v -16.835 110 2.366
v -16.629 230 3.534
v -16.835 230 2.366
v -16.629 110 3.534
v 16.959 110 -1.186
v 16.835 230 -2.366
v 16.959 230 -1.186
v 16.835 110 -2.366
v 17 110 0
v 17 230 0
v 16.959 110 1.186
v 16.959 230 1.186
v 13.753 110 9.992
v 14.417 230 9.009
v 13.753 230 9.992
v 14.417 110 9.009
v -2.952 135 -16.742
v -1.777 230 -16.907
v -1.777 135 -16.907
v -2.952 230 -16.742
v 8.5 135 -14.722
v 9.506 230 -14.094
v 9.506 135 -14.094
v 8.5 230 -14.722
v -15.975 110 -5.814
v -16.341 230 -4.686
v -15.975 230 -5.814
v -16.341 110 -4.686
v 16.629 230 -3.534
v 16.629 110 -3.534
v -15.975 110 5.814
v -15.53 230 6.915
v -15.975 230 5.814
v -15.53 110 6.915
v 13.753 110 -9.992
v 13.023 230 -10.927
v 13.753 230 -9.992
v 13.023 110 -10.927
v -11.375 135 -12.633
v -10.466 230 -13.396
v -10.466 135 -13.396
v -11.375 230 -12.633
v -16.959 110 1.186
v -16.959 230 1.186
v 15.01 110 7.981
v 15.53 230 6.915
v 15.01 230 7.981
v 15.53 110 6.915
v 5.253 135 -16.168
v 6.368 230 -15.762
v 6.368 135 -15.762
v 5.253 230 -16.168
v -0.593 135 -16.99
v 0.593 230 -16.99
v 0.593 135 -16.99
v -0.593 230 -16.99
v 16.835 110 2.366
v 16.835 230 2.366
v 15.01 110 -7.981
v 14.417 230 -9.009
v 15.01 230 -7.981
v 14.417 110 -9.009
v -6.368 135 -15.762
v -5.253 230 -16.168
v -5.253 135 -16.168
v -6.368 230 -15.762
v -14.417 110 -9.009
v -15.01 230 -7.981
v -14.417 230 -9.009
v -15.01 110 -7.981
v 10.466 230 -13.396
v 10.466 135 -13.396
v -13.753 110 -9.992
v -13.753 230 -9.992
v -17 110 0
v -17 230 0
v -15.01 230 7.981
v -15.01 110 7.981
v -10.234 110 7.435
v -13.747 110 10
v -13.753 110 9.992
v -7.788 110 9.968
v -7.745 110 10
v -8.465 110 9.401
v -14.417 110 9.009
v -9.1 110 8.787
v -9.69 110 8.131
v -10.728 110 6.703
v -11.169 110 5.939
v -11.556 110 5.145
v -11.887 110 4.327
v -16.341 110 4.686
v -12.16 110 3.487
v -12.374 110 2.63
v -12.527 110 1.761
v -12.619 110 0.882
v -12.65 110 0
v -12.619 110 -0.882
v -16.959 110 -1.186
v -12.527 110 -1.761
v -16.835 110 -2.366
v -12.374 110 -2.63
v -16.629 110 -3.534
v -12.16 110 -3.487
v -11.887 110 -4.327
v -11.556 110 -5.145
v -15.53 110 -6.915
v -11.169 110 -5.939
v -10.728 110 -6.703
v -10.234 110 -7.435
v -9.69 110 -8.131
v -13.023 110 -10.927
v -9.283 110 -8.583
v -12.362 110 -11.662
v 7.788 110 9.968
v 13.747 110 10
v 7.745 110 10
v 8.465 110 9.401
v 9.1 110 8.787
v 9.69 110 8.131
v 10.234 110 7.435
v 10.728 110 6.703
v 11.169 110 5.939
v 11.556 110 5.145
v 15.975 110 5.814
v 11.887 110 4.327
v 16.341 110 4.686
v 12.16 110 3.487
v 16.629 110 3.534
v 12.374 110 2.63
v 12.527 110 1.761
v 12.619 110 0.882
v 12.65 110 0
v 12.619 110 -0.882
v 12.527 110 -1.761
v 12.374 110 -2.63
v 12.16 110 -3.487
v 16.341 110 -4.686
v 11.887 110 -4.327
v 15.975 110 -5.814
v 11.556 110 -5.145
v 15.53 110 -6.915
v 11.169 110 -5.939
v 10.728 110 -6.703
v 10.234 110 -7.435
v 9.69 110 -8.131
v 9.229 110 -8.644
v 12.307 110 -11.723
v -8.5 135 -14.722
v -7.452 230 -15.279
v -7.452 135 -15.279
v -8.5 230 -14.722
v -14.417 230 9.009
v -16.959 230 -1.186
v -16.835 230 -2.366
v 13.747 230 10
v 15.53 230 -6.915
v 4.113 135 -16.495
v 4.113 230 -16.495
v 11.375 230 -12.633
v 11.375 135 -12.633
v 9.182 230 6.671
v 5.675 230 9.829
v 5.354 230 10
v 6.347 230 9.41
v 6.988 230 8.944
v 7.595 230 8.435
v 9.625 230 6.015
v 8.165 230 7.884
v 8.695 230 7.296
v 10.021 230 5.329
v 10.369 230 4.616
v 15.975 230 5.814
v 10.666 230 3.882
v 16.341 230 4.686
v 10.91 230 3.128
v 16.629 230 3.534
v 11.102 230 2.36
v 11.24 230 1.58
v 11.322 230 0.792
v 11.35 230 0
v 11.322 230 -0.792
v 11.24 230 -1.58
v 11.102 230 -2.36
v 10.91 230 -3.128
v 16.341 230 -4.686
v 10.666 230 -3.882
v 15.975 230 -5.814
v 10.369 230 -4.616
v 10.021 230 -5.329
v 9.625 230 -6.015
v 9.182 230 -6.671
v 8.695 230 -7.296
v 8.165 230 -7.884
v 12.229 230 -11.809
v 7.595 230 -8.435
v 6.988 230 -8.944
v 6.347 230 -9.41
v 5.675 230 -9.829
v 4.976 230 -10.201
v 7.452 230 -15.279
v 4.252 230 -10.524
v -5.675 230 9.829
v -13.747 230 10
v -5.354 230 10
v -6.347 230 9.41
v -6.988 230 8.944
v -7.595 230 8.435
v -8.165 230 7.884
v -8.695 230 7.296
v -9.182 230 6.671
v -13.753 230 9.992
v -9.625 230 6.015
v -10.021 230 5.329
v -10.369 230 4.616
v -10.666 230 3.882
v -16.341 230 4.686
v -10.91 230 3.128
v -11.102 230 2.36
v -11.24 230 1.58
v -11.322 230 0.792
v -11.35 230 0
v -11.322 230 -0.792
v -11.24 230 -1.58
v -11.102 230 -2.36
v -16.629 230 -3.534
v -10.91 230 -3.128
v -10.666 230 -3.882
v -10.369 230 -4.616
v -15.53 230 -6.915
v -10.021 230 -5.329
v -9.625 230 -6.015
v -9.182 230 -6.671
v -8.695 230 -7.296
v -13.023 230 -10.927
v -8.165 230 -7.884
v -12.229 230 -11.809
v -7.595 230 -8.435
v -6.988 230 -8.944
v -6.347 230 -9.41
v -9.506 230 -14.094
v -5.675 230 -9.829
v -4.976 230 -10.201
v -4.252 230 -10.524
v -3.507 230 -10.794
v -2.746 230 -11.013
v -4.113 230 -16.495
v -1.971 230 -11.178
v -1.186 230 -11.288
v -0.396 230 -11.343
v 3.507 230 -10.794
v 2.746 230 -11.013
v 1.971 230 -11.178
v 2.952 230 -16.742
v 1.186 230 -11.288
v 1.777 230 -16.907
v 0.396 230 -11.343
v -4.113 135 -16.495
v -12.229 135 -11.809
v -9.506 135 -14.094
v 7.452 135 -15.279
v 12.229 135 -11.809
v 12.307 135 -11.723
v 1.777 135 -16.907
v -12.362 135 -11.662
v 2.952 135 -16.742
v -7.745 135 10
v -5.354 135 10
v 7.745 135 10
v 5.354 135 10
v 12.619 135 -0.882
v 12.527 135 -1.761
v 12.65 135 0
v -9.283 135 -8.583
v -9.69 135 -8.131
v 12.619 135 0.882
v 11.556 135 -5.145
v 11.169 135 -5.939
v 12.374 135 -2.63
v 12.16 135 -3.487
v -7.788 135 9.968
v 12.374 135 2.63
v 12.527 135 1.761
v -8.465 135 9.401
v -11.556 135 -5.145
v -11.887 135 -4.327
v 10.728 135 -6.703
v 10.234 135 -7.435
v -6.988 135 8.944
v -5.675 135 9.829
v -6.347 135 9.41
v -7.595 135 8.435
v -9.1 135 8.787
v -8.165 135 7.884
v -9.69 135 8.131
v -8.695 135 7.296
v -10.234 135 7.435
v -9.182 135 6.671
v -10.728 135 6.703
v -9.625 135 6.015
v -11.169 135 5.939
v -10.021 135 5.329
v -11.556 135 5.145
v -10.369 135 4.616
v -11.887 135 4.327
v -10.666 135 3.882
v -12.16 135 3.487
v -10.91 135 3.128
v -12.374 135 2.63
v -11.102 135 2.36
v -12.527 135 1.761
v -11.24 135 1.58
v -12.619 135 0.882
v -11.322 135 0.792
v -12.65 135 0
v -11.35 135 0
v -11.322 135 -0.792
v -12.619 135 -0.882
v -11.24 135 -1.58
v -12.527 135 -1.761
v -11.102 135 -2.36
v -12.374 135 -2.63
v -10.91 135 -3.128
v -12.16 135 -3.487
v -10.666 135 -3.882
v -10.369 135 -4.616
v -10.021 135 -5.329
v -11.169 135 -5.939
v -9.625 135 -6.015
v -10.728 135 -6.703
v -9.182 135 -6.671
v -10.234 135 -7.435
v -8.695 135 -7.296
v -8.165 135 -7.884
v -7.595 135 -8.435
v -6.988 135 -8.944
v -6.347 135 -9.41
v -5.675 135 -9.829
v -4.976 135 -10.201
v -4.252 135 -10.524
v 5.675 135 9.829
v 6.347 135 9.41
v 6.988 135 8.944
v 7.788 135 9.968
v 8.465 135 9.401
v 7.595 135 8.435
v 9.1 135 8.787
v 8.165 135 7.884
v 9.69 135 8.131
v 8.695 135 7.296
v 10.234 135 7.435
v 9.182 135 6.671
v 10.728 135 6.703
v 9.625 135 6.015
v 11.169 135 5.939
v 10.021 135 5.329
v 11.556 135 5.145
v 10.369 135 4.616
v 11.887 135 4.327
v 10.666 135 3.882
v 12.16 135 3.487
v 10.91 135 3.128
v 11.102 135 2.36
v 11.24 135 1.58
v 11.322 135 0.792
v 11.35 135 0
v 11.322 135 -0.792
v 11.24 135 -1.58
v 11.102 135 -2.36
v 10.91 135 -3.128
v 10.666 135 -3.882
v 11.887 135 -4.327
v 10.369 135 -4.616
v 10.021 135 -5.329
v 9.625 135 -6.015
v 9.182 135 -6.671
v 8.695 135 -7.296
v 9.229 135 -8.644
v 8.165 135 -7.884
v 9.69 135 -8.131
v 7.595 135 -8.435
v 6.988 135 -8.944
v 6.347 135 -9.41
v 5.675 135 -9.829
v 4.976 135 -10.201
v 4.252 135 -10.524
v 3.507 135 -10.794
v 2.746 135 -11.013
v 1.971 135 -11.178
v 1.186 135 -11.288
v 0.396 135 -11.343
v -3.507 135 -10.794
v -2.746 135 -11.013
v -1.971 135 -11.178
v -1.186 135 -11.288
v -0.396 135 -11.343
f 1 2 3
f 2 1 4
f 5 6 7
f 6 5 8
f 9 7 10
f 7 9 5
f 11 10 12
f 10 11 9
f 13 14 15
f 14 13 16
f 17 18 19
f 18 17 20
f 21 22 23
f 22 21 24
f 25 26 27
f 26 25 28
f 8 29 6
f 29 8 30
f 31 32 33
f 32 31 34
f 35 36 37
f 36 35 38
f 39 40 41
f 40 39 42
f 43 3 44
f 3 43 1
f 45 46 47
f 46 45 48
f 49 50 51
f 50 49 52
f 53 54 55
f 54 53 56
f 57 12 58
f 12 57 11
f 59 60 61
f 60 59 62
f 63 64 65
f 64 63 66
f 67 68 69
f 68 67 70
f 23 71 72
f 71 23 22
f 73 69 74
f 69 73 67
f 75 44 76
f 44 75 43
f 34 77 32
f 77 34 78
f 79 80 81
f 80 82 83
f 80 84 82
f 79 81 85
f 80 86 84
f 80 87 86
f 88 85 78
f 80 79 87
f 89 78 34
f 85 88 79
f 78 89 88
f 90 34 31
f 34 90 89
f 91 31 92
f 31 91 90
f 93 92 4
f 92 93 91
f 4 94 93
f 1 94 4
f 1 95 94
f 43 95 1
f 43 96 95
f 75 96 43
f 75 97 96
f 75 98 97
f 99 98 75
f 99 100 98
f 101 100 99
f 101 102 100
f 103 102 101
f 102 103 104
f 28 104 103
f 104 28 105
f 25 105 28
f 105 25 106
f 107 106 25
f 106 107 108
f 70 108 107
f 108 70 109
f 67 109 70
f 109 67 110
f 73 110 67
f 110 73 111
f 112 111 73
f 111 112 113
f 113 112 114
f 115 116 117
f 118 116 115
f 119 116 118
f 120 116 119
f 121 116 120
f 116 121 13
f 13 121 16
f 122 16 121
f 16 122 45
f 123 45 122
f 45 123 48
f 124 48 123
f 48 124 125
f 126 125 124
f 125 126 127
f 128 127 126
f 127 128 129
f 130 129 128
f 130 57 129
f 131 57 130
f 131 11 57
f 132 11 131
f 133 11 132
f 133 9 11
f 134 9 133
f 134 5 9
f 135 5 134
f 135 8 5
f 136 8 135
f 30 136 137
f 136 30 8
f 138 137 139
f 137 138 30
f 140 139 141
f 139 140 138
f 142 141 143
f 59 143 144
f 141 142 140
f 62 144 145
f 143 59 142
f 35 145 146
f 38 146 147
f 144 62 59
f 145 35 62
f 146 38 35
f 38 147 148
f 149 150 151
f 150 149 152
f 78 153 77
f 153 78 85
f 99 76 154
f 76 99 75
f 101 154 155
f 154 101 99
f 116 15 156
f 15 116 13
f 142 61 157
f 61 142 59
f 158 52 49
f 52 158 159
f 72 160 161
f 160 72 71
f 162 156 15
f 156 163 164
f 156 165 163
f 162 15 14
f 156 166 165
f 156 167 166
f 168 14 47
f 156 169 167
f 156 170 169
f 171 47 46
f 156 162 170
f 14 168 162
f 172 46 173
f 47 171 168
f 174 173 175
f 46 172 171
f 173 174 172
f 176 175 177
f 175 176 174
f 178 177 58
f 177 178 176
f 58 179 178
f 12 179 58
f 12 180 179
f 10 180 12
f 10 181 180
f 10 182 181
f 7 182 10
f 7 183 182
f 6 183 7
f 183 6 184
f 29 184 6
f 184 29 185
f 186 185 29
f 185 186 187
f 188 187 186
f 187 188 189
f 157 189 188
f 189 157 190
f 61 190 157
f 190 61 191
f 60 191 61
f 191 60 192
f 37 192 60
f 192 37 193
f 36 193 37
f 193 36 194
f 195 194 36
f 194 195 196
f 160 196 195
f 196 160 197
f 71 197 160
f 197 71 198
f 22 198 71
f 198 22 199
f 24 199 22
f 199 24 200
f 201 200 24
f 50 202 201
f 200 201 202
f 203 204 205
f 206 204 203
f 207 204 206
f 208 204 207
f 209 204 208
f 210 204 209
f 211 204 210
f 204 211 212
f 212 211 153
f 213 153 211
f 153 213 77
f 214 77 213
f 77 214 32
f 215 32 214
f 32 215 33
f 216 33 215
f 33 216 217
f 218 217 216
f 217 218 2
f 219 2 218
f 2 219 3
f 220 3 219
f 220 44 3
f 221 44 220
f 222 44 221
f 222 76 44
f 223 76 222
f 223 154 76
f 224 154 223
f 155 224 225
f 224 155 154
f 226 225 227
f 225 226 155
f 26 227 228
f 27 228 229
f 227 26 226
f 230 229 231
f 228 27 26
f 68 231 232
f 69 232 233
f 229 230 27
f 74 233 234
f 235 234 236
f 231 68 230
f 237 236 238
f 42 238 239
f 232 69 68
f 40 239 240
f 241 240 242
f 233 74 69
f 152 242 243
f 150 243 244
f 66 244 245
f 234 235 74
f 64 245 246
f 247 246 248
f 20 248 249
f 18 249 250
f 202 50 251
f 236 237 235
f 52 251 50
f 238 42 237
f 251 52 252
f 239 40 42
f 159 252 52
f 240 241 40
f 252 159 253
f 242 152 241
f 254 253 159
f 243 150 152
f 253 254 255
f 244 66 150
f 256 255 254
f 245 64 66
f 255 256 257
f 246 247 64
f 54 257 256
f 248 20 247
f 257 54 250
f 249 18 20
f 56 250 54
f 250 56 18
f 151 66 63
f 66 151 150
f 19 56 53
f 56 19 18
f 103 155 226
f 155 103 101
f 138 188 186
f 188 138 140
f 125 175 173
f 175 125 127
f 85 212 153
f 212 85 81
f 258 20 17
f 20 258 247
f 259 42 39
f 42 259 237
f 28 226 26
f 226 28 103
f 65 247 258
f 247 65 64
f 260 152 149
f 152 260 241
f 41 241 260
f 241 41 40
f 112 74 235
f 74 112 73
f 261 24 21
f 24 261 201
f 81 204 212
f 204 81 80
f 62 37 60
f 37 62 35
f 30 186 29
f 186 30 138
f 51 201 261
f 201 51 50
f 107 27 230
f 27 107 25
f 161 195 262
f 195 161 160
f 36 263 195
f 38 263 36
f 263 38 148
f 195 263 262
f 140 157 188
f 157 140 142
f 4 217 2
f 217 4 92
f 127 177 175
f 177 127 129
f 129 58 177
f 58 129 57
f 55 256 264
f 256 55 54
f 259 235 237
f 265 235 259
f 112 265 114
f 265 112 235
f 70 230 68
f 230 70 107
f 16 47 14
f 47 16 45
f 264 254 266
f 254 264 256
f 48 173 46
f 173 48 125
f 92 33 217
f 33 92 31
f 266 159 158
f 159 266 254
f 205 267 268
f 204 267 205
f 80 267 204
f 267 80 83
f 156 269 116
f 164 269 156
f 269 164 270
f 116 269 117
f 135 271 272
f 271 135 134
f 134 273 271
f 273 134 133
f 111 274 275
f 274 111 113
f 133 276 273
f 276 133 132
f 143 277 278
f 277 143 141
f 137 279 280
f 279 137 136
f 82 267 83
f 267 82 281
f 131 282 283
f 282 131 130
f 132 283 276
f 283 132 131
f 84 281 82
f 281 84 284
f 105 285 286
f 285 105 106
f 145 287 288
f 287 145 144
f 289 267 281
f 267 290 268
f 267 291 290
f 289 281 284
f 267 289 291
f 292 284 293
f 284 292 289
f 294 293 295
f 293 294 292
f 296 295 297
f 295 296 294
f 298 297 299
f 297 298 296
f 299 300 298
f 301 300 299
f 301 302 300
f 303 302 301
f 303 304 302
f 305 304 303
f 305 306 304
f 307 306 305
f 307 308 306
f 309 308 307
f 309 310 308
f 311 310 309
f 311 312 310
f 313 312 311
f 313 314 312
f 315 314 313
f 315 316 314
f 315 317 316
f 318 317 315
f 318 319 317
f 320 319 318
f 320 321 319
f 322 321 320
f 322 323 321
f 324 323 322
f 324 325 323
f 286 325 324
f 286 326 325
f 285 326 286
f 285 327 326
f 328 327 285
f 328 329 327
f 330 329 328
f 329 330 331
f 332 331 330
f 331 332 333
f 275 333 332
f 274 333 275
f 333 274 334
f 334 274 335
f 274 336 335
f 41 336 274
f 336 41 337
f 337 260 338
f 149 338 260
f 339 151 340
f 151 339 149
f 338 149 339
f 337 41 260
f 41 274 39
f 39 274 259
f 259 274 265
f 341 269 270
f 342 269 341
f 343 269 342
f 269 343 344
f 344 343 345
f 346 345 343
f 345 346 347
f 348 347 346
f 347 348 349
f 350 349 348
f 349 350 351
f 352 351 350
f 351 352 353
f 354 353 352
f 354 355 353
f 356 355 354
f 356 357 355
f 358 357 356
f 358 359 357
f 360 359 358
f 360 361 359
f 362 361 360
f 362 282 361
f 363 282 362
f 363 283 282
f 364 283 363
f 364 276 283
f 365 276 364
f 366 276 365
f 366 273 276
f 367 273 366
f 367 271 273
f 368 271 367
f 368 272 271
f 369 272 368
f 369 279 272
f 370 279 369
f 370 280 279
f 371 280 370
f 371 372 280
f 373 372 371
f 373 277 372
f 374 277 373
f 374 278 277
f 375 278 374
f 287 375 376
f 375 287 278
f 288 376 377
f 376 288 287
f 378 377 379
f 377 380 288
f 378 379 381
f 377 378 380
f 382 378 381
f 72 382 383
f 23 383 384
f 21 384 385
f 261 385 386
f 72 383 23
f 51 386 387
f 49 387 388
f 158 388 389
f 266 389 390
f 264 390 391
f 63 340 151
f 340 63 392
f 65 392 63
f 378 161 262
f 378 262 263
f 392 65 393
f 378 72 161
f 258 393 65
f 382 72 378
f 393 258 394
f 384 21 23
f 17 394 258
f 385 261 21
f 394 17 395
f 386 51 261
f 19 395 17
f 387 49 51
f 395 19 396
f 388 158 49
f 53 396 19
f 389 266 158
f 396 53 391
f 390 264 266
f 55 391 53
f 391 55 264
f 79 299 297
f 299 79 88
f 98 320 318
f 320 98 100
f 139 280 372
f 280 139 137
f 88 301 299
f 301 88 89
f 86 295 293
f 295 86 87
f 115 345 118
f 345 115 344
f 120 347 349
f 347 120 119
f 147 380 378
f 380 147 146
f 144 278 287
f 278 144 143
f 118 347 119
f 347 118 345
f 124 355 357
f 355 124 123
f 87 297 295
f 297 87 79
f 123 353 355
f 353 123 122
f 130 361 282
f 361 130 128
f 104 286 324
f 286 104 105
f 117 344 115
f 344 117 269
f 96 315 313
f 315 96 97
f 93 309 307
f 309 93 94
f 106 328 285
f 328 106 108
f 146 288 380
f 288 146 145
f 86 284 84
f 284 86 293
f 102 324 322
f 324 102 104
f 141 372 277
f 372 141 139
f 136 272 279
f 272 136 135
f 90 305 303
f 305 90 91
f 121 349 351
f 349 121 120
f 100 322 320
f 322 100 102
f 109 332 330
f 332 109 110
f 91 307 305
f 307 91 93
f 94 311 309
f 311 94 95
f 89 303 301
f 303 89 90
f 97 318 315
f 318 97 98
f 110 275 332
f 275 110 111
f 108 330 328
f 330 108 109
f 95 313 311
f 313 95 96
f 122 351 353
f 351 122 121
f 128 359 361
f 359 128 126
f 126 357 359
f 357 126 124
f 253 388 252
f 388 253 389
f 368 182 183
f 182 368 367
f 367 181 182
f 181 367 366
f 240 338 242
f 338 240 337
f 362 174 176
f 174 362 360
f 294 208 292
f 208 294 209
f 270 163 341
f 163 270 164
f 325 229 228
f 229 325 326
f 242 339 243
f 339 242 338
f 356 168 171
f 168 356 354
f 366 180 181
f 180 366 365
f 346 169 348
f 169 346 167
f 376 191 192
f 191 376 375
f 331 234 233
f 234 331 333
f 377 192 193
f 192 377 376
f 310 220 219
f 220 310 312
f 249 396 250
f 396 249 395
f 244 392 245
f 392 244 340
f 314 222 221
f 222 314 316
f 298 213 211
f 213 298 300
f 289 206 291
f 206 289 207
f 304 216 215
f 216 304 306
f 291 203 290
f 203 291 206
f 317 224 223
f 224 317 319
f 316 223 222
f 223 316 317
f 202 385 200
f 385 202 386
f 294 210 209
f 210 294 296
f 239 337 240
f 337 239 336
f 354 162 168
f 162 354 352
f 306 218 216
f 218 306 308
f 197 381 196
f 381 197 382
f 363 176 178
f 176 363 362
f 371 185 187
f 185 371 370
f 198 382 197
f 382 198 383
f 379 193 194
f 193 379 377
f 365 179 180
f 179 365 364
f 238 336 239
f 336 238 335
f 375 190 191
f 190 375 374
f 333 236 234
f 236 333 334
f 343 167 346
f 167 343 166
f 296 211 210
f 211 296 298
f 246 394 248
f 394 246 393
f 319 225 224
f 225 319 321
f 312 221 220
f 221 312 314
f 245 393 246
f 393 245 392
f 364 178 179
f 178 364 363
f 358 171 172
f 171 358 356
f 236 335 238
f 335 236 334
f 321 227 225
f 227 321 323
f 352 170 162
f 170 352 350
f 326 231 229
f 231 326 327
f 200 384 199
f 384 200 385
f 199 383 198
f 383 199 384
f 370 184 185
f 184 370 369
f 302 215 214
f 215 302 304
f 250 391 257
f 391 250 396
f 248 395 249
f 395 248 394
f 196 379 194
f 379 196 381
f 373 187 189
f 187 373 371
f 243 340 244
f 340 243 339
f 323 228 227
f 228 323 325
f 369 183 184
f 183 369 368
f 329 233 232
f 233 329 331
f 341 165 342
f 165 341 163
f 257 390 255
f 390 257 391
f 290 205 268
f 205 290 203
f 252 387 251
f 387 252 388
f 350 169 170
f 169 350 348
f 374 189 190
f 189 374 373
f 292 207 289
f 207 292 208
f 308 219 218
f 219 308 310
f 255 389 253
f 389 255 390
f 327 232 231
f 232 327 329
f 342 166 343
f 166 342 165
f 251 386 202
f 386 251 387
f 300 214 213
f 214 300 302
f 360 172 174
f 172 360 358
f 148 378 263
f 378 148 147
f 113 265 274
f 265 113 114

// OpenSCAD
/*
simplify by making the bullet fly right down the y a
this gives the perspective of holding the gun; a natural view.
*/

$fn=90;
difference(){
sight();
gun();
}


module sight(){
    //the sight is a cylinder and is cut out by the gun
    difference(){            
    translate([0,110,0]){
                    rotate([-90,0,0]){
                cylinder(h=120, d=34);
                    }
            }
    //with the rail merged onto it
            //add rail here
    //and the top cut off to clear fixed sites        
    translate([-20,100,10]){cube([40,200,20]);}
    //then poke a bunch of magnet holes and viola!
            }
}
module gun(){
    union(){
barrel();
frame();
    }
}
module barrel(){
    //model of the barrel
     rotate([-90,0,0]){
         union(){
             cylinder(d=25.3, h=135);
             translate([0,0,135]){cylinder(d=22.7, h=100);}
         }
    }
}

module frame (){
    //module part of the frame
    union(){
        translate([-15,0,-26]){
        cube([30,135,14]);
    }
    translate([-14.20,0,-13.5]){
        rotate([0,45,0]){
            cube([20,135,20]);    
        }
    }
}
}
